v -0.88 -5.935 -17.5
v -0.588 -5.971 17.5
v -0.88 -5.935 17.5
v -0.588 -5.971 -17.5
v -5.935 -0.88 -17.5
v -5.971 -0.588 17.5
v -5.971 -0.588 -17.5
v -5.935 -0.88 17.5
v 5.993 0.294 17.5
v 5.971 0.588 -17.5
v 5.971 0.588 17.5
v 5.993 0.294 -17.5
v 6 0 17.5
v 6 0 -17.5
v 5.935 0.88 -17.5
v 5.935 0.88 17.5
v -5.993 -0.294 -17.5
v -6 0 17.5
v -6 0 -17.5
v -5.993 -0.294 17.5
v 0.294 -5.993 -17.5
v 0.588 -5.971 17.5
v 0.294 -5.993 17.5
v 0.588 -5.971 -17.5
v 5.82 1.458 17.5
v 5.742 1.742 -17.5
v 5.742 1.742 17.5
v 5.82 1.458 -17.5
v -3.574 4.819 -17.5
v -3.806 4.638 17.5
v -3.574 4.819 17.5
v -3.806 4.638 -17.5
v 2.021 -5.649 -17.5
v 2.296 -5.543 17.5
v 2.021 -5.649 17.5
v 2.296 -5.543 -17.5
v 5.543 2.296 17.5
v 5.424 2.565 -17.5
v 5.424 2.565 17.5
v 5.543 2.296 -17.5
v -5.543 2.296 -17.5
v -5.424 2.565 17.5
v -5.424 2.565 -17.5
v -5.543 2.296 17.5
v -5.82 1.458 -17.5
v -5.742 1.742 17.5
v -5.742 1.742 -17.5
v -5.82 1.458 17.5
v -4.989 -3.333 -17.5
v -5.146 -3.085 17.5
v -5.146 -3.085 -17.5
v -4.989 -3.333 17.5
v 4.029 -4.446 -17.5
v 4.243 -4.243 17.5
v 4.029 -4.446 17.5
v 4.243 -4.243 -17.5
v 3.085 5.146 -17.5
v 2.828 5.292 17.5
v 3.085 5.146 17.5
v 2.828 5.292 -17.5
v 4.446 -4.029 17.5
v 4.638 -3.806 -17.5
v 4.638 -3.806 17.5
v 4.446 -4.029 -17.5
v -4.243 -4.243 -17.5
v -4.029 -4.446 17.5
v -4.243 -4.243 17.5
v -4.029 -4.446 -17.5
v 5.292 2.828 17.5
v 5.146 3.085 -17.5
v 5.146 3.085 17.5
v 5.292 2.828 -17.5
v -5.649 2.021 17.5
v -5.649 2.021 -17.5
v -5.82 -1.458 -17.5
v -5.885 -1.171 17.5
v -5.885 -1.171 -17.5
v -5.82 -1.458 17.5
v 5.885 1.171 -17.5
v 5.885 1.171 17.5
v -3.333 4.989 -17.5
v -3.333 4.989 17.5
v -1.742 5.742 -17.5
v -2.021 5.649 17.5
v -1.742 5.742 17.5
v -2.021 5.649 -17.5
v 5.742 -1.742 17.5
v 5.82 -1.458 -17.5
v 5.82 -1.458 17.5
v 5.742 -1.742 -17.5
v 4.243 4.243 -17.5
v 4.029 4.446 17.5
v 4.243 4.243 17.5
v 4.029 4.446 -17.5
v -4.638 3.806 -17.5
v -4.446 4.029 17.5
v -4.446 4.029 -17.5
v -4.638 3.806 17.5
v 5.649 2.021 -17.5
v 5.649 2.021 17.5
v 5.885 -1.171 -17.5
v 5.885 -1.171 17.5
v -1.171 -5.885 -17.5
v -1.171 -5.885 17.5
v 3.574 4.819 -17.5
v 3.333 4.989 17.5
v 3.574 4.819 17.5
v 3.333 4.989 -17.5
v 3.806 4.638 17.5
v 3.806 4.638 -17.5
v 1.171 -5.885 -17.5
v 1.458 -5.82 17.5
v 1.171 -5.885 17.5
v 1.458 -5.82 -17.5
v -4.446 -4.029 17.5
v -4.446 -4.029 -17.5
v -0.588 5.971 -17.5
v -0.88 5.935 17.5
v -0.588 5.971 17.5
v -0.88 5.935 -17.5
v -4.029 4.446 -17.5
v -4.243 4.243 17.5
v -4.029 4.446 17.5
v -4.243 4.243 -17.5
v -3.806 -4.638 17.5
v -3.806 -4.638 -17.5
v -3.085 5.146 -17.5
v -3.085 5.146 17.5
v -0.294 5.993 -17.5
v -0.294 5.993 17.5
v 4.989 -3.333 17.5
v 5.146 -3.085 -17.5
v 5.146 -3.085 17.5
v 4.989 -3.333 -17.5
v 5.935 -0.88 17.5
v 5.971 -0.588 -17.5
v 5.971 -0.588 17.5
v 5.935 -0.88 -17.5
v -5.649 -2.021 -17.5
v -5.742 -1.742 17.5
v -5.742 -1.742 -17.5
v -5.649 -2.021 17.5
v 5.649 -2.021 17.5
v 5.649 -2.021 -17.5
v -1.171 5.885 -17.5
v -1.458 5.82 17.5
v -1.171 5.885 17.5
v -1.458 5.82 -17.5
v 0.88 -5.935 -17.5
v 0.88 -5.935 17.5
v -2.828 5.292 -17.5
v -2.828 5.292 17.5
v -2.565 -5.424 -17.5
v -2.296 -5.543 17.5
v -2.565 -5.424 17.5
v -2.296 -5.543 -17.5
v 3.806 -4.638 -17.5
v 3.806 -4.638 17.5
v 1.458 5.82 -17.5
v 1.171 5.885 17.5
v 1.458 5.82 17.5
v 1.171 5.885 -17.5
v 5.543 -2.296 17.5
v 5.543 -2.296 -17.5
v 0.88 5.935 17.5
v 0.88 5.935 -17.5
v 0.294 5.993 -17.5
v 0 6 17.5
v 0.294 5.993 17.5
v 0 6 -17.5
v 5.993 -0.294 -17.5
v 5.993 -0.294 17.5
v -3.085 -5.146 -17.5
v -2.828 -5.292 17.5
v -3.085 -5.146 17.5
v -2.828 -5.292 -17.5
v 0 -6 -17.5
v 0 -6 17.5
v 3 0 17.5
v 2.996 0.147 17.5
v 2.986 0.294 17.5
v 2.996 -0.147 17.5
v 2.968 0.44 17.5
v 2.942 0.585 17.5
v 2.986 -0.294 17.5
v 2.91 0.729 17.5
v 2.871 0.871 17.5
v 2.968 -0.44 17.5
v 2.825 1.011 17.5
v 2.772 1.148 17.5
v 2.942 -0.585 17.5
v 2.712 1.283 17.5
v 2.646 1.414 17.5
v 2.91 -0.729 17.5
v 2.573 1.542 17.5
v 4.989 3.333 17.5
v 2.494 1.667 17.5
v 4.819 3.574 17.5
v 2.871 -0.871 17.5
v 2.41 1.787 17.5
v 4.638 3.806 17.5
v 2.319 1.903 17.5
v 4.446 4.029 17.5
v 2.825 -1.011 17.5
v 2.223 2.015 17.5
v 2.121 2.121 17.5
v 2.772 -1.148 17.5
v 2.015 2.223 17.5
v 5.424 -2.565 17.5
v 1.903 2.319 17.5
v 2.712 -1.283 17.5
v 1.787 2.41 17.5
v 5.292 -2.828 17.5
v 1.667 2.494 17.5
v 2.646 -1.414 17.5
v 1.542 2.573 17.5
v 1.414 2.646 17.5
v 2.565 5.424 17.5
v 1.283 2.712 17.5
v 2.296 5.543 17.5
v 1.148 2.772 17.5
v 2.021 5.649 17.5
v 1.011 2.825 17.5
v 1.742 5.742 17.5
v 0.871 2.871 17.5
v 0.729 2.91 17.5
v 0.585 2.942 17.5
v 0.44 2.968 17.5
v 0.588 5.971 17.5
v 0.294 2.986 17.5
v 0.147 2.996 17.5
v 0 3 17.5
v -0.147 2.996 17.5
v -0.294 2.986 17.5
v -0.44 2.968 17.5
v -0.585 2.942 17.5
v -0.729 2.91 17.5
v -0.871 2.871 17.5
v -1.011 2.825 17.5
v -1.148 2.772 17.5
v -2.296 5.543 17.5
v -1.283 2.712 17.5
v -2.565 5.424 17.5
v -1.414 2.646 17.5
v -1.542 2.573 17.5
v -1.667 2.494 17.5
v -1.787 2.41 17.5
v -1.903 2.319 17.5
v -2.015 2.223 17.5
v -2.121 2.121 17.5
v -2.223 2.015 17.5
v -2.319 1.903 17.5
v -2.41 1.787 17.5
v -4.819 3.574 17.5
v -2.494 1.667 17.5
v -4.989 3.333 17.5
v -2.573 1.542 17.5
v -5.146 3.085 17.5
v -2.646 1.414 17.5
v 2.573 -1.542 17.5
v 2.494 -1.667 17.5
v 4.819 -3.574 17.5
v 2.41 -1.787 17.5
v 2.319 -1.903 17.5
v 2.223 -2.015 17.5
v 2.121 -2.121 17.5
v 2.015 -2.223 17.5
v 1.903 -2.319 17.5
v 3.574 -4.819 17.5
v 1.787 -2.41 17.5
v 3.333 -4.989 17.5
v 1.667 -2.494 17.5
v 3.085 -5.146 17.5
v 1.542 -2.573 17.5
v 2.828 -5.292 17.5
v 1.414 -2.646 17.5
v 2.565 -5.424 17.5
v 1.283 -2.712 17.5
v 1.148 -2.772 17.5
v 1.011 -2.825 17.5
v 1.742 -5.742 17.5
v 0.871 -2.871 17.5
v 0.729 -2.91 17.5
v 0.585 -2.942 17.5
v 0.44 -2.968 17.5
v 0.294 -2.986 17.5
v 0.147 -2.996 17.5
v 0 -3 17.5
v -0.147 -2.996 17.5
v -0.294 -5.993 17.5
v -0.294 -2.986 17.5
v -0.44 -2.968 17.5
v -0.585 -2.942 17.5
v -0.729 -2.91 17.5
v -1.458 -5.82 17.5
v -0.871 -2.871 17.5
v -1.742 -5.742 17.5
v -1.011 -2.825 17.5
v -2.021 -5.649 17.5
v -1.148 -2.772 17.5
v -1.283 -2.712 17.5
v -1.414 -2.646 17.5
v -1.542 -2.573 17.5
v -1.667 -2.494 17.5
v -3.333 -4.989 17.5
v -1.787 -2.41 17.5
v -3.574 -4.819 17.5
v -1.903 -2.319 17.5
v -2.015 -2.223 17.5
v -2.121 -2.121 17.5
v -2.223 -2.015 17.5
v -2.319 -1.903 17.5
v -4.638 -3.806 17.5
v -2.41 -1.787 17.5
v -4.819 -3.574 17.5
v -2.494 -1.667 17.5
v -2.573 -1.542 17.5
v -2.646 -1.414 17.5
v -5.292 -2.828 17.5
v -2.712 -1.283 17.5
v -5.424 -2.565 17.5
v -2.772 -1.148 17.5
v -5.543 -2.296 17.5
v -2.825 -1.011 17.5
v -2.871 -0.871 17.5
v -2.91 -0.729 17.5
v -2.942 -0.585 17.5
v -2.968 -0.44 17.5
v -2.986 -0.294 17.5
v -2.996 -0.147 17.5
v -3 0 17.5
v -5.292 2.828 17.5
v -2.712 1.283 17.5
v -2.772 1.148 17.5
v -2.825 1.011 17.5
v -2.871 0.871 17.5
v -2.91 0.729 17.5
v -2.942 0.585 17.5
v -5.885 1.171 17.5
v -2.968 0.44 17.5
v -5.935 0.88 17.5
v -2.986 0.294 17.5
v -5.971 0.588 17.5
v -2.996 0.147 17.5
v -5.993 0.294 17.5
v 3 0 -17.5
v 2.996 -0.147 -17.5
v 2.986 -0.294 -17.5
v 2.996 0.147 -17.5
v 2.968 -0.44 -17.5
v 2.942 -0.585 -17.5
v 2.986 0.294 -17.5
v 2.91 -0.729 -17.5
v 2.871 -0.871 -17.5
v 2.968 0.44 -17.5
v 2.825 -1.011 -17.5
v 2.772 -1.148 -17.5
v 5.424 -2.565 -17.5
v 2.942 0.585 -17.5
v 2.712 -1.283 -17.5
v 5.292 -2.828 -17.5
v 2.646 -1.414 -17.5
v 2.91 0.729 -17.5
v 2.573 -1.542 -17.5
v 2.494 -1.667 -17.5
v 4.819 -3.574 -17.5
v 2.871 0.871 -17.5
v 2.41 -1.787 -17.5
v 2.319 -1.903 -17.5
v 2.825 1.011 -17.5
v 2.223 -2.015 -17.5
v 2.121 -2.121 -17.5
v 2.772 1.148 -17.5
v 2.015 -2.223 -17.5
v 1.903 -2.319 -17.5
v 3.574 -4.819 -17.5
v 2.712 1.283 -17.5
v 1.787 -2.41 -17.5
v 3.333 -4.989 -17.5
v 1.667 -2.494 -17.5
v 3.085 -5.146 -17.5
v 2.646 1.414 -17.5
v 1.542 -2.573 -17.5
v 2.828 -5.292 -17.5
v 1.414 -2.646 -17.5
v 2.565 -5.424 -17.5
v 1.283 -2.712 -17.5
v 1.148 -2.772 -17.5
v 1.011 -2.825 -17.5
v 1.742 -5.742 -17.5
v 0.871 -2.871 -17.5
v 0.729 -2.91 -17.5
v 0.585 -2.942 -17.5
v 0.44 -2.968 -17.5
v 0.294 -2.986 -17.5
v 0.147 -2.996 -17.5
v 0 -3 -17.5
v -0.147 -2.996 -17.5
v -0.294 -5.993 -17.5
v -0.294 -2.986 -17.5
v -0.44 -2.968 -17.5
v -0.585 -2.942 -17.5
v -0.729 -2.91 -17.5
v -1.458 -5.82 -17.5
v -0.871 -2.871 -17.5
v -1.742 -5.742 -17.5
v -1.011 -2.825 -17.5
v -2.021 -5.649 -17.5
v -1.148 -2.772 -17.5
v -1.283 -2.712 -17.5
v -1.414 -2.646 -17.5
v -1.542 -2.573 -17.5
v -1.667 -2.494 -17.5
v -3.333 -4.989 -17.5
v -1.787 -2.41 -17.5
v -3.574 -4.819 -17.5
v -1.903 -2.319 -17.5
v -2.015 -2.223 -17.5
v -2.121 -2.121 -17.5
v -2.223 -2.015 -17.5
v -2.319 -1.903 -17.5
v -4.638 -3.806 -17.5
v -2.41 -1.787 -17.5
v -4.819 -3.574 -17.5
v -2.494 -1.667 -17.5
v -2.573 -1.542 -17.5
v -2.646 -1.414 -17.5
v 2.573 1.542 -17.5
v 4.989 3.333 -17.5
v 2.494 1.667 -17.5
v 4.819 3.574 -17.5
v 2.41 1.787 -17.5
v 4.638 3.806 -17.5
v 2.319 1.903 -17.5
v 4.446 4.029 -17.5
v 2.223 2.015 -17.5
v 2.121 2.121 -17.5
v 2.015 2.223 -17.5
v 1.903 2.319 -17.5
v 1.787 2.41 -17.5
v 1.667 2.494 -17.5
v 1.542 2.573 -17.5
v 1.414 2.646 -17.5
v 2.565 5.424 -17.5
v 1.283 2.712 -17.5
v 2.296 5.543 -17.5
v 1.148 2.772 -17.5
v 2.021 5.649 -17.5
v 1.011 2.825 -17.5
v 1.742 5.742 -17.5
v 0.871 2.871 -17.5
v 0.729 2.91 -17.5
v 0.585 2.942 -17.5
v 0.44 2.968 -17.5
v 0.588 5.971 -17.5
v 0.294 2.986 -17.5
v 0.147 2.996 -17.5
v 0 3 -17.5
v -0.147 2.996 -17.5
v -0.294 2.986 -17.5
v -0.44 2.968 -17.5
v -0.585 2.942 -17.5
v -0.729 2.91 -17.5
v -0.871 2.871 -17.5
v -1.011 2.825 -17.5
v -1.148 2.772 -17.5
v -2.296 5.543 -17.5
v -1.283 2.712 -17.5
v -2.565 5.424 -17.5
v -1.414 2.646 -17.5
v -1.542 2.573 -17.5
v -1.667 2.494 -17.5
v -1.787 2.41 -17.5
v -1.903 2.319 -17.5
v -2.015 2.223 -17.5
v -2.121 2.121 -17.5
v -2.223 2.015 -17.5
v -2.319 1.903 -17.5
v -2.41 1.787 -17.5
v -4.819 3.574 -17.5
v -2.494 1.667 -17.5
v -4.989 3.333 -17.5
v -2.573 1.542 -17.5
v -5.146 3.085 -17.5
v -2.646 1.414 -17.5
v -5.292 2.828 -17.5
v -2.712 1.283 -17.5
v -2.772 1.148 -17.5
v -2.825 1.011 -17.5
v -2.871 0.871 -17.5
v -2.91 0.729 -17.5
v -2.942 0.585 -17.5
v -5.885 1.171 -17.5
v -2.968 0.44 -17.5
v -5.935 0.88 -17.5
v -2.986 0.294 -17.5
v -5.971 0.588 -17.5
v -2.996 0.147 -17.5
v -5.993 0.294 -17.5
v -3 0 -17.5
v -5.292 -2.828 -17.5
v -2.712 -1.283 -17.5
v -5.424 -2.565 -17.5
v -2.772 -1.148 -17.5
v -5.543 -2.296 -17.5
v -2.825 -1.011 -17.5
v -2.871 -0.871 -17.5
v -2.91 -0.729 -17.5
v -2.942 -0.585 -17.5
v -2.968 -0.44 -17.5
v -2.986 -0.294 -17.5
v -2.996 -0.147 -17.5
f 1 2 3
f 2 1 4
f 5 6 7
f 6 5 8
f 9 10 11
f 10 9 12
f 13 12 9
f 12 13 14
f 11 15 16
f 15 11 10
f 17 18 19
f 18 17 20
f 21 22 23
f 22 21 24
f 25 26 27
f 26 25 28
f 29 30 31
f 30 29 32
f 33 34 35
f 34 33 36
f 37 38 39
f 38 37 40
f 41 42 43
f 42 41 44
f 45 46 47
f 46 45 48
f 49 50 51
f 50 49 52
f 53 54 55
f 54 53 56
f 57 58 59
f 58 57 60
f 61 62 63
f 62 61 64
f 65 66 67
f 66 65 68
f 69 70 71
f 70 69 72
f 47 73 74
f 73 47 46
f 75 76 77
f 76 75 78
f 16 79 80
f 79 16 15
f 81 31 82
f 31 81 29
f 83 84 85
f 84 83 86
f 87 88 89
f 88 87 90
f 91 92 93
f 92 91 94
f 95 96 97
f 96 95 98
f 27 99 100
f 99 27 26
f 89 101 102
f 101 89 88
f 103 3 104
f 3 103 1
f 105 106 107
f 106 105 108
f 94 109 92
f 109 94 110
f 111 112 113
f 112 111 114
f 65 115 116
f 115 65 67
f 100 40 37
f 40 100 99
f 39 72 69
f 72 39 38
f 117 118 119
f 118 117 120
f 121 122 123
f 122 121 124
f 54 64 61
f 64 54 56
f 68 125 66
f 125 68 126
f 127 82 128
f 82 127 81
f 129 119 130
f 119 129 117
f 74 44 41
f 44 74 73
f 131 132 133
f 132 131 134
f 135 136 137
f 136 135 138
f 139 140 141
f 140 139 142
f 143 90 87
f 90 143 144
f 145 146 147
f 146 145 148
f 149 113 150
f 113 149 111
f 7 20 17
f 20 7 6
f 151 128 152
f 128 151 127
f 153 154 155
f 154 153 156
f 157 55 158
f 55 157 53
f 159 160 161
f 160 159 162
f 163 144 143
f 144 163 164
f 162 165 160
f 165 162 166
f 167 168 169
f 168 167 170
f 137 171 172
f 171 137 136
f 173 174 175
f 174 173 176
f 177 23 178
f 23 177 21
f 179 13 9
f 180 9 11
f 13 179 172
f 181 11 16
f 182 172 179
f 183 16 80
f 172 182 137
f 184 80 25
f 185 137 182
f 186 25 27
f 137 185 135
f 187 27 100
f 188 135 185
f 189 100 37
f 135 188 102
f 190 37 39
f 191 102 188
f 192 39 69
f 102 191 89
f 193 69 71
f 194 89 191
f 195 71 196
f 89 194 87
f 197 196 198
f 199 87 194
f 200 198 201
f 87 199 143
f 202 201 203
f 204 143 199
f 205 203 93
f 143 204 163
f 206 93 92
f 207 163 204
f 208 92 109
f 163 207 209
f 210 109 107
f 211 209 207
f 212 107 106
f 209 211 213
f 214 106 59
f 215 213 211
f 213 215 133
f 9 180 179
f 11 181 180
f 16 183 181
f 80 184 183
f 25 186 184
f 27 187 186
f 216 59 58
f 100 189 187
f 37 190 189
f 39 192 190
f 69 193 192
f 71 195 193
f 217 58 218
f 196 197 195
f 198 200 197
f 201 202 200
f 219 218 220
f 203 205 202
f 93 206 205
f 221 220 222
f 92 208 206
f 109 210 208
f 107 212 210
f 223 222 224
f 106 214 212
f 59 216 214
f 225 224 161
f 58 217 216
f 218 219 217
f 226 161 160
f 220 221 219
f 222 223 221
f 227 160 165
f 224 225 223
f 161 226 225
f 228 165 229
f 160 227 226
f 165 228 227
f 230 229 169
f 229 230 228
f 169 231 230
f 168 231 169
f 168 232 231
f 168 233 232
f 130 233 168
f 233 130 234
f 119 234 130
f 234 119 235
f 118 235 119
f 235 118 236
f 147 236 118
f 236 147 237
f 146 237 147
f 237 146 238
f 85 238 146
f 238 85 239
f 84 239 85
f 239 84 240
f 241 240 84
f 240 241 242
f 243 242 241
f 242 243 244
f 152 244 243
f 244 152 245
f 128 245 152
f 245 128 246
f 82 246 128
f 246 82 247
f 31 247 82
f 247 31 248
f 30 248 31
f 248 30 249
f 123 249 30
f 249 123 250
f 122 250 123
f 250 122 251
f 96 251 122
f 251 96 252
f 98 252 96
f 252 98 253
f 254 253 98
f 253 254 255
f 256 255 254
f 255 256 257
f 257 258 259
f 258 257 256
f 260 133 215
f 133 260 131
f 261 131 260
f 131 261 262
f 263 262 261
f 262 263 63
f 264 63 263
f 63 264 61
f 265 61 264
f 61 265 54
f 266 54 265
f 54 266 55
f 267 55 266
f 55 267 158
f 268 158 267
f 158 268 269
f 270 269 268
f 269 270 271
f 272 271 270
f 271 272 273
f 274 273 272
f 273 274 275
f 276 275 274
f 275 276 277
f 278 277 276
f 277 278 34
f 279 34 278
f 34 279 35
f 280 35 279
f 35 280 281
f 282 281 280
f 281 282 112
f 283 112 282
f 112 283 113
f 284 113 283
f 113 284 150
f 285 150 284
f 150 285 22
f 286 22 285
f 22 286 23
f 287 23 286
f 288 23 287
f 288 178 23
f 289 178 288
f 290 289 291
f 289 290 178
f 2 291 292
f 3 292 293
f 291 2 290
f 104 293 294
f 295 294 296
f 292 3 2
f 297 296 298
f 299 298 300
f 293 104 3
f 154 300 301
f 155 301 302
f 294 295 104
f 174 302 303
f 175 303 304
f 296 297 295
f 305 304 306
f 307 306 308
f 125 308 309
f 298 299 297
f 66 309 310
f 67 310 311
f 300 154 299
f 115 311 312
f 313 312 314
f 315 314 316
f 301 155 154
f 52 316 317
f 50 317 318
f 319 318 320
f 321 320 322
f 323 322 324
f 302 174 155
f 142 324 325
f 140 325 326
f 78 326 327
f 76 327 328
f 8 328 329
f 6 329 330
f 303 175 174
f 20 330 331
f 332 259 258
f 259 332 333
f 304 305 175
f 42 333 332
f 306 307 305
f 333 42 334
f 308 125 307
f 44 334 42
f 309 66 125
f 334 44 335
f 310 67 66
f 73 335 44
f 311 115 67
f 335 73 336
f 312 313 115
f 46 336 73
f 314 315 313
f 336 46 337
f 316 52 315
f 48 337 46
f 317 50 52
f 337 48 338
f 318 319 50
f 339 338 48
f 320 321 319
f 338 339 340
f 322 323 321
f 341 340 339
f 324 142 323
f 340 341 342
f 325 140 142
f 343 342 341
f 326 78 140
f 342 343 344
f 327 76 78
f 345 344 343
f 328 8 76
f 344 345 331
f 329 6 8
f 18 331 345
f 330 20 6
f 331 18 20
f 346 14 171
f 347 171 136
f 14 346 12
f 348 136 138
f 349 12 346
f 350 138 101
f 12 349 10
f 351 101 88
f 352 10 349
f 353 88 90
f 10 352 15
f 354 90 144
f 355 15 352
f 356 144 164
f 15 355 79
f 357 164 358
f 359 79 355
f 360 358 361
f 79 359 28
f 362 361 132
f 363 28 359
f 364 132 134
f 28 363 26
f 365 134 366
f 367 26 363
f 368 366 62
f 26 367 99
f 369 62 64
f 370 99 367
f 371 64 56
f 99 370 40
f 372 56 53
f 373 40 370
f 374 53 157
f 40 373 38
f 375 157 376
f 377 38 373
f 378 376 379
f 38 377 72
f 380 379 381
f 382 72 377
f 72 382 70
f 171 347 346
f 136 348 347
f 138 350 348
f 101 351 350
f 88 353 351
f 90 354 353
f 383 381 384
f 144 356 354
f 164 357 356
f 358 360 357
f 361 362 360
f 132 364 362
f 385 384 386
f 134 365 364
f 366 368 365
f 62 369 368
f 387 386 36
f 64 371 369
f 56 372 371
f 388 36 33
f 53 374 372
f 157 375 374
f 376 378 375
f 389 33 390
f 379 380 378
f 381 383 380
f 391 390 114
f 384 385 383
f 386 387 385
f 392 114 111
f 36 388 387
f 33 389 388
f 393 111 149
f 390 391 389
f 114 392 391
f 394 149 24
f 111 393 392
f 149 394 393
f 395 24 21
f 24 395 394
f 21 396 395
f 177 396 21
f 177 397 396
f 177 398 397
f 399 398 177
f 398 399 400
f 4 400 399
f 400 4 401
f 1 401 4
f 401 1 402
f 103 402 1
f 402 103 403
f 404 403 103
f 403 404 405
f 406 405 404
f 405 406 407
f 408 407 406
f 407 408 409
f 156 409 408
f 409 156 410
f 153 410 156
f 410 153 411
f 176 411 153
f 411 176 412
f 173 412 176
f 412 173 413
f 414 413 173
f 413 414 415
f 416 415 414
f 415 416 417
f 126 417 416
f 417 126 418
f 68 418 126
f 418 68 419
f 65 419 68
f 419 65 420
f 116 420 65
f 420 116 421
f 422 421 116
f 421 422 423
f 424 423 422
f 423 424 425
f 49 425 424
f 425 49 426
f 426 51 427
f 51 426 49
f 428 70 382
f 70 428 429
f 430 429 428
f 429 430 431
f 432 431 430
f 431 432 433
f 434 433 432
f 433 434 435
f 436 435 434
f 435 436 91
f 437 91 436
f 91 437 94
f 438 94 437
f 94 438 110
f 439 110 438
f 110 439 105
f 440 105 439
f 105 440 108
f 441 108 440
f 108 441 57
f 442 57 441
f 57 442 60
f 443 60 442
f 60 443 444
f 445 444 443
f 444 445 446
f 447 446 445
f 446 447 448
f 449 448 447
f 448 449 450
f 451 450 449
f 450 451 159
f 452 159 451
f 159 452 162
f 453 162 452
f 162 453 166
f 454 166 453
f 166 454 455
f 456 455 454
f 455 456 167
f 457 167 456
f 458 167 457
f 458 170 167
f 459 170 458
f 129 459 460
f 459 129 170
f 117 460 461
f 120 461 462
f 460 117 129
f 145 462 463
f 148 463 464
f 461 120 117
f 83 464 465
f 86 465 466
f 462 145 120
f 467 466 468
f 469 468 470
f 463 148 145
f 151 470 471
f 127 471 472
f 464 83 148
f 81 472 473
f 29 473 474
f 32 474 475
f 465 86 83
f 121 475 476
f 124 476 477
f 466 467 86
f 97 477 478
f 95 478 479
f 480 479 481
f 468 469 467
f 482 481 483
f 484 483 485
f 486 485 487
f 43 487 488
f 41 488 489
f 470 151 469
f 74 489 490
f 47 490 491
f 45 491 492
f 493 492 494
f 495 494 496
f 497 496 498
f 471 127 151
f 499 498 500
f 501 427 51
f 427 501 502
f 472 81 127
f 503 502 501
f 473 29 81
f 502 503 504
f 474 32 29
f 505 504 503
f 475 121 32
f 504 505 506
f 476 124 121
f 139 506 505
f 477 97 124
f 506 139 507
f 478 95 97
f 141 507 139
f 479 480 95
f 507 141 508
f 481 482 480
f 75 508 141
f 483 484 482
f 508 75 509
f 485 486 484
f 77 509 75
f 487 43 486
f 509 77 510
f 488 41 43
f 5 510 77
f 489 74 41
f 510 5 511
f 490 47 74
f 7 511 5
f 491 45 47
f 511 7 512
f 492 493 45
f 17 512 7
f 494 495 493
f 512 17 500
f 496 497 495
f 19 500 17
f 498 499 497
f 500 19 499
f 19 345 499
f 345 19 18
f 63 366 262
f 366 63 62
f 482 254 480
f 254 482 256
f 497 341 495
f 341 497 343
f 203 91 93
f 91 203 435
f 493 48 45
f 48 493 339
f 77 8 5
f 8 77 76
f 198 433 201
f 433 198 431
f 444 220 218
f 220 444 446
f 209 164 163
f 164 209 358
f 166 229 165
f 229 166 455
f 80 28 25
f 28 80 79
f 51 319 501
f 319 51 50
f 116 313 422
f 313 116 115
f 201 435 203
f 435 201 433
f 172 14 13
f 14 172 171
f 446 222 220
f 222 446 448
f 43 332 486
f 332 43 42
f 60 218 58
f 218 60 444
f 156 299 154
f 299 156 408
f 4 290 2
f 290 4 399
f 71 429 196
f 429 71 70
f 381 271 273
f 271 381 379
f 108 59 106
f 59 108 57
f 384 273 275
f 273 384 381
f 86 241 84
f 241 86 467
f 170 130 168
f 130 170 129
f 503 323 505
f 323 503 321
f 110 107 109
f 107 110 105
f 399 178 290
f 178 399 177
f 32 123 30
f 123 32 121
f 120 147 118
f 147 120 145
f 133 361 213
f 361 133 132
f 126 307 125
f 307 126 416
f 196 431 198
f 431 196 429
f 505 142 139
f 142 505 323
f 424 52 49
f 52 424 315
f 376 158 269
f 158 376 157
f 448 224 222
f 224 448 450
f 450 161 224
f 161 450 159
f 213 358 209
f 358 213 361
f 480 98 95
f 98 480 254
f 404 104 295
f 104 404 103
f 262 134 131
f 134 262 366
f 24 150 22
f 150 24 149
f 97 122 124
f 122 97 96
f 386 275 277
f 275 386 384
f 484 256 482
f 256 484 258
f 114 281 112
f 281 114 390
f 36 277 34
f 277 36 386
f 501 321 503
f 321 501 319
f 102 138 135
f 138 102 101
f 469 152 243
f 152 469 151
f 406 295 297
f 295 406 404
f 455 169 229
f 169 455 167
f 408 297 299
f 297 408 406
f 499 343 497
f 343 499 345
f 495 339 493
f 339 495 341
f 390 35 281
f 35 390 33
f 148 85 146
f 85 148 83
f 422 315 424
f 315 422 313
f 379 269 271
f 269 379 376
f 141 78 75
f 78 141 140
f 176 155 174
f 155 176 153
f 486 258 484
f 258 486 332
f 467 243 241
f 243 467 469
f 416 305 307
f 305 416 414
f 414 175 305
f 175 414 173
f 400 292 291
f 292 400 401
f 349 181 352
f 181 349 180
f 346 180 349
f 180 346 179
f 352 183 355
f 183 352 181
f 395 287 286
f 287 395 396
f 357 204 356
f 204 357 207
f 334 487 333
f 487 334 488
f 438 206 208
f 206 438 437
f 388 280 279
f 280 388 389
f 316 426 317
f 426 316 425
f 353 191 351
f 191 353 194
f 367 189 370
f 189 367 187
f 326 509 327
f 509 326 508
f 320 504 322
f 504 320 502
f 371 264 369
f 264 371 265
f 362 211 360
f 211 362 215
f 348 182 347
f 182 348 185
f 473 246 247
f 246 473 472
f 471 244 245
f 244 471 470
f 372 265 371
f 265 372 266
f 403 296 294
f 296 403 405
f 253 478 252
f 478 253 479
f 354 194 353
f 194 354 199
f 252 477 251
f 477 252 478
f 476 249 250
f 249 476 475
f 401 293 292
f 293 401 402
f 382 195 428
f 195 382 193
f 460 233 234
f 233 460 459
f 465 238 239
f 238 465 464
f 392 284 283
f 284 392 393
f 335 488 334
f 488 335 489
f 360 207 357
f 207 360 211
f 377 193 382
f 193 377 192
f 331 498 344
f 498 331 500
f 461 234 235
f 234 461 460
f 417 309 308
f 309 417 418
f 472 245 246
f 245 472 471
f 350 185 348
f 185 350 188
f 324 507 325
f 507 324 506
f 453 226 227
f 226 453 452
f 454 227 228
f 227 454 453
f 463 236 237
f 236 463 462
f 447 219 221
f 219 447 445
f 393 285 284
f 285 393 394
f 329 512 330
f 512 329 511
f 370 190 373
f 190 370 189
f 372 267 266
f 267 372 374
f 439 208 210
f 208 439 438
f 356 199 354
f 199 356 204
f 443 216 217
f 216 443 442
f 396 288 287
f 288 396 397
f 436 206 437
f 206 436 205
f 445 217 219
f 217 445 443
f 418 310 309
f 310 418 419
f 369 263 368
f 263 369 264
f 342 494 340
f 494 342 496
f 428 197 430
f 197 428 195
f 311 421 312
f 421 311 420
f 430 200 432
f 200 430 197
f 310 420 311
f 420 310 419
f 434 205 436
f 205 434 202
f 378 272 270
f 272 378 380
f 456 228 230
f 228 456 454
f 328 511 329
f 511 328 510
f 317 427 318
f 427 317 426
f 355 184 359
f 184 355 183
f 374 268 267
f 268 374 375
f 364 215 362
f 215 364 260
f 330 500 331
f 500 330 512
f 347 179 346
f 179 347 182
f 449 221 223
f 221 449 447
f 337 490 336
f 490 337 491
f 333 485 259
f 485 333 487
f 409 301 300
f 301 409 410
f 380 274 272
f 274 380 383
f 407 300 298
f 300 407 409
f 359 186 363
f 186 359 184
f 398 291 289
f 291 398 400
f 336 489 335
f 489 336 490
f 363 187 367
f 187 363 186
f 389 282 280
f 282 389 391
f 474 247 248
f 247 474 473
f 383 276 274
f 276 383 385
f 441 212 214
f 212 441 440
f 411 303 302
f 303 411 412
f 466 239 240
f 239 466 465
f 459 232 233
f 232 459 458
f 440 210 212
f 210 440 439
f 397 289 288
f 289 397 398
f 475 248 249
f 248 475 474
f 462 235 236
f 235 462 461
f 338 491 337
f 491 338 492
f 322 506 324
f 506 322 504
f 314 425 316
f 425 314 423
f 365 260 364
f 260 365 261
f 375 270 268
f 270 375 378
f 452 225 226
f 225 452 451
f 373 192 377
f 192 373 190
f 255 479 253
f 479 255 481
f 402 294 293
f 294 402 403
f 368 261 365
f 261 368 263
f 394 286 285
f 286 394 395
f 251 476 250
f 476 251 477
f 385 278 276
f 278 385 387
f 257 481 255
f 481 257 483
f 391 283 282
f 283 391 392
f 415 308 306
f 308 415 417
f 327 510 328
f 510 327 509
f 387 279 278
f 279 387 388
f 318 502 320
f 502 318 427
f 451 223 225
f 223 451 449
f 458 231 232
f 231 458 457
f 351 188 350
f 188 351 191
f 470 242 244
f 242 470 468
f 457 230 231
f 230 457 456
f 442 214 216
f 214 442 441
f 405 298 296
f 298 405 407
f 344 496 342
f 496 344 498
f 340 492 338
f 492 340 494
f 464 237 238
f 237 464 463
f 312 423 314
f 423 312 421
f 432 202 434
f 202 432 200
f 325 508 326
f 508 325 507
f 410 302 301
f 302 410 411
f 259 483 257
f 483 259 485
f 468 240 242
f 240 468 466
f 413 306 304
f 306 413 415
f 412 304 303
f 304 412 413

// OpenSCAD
// Long linear bearing (simple): 6mm bore, 12mm OD, 35mm length
bore_diameter_mm  = 6.0;
outer_diameter_mm = 12.0;
length_mm         = 35.0;

centered = 1;          // 1 = centered on origin, 0 = sits on Z=0
overlap_mm = 0.2;      // small overlap to ensure clean boolean

$fn = 128;

module linear_bearing_simple() {
    zc = centered ? 0 : length_mm/2;

    translate([0, 0, zc])
    difference() {
        // Outer body (OD = 12mm, L = 35mm)
        cylinder(d=outer_diameter_mm, h=length_mm, center=true);

        // Through-bore (ID = 6mm) cut fully through with overlap
        cylinder(d=bore_diameter_mm, h=length_mm + 2*overlap_mm, center=true);
    }
}

linear_bearing_simple();
